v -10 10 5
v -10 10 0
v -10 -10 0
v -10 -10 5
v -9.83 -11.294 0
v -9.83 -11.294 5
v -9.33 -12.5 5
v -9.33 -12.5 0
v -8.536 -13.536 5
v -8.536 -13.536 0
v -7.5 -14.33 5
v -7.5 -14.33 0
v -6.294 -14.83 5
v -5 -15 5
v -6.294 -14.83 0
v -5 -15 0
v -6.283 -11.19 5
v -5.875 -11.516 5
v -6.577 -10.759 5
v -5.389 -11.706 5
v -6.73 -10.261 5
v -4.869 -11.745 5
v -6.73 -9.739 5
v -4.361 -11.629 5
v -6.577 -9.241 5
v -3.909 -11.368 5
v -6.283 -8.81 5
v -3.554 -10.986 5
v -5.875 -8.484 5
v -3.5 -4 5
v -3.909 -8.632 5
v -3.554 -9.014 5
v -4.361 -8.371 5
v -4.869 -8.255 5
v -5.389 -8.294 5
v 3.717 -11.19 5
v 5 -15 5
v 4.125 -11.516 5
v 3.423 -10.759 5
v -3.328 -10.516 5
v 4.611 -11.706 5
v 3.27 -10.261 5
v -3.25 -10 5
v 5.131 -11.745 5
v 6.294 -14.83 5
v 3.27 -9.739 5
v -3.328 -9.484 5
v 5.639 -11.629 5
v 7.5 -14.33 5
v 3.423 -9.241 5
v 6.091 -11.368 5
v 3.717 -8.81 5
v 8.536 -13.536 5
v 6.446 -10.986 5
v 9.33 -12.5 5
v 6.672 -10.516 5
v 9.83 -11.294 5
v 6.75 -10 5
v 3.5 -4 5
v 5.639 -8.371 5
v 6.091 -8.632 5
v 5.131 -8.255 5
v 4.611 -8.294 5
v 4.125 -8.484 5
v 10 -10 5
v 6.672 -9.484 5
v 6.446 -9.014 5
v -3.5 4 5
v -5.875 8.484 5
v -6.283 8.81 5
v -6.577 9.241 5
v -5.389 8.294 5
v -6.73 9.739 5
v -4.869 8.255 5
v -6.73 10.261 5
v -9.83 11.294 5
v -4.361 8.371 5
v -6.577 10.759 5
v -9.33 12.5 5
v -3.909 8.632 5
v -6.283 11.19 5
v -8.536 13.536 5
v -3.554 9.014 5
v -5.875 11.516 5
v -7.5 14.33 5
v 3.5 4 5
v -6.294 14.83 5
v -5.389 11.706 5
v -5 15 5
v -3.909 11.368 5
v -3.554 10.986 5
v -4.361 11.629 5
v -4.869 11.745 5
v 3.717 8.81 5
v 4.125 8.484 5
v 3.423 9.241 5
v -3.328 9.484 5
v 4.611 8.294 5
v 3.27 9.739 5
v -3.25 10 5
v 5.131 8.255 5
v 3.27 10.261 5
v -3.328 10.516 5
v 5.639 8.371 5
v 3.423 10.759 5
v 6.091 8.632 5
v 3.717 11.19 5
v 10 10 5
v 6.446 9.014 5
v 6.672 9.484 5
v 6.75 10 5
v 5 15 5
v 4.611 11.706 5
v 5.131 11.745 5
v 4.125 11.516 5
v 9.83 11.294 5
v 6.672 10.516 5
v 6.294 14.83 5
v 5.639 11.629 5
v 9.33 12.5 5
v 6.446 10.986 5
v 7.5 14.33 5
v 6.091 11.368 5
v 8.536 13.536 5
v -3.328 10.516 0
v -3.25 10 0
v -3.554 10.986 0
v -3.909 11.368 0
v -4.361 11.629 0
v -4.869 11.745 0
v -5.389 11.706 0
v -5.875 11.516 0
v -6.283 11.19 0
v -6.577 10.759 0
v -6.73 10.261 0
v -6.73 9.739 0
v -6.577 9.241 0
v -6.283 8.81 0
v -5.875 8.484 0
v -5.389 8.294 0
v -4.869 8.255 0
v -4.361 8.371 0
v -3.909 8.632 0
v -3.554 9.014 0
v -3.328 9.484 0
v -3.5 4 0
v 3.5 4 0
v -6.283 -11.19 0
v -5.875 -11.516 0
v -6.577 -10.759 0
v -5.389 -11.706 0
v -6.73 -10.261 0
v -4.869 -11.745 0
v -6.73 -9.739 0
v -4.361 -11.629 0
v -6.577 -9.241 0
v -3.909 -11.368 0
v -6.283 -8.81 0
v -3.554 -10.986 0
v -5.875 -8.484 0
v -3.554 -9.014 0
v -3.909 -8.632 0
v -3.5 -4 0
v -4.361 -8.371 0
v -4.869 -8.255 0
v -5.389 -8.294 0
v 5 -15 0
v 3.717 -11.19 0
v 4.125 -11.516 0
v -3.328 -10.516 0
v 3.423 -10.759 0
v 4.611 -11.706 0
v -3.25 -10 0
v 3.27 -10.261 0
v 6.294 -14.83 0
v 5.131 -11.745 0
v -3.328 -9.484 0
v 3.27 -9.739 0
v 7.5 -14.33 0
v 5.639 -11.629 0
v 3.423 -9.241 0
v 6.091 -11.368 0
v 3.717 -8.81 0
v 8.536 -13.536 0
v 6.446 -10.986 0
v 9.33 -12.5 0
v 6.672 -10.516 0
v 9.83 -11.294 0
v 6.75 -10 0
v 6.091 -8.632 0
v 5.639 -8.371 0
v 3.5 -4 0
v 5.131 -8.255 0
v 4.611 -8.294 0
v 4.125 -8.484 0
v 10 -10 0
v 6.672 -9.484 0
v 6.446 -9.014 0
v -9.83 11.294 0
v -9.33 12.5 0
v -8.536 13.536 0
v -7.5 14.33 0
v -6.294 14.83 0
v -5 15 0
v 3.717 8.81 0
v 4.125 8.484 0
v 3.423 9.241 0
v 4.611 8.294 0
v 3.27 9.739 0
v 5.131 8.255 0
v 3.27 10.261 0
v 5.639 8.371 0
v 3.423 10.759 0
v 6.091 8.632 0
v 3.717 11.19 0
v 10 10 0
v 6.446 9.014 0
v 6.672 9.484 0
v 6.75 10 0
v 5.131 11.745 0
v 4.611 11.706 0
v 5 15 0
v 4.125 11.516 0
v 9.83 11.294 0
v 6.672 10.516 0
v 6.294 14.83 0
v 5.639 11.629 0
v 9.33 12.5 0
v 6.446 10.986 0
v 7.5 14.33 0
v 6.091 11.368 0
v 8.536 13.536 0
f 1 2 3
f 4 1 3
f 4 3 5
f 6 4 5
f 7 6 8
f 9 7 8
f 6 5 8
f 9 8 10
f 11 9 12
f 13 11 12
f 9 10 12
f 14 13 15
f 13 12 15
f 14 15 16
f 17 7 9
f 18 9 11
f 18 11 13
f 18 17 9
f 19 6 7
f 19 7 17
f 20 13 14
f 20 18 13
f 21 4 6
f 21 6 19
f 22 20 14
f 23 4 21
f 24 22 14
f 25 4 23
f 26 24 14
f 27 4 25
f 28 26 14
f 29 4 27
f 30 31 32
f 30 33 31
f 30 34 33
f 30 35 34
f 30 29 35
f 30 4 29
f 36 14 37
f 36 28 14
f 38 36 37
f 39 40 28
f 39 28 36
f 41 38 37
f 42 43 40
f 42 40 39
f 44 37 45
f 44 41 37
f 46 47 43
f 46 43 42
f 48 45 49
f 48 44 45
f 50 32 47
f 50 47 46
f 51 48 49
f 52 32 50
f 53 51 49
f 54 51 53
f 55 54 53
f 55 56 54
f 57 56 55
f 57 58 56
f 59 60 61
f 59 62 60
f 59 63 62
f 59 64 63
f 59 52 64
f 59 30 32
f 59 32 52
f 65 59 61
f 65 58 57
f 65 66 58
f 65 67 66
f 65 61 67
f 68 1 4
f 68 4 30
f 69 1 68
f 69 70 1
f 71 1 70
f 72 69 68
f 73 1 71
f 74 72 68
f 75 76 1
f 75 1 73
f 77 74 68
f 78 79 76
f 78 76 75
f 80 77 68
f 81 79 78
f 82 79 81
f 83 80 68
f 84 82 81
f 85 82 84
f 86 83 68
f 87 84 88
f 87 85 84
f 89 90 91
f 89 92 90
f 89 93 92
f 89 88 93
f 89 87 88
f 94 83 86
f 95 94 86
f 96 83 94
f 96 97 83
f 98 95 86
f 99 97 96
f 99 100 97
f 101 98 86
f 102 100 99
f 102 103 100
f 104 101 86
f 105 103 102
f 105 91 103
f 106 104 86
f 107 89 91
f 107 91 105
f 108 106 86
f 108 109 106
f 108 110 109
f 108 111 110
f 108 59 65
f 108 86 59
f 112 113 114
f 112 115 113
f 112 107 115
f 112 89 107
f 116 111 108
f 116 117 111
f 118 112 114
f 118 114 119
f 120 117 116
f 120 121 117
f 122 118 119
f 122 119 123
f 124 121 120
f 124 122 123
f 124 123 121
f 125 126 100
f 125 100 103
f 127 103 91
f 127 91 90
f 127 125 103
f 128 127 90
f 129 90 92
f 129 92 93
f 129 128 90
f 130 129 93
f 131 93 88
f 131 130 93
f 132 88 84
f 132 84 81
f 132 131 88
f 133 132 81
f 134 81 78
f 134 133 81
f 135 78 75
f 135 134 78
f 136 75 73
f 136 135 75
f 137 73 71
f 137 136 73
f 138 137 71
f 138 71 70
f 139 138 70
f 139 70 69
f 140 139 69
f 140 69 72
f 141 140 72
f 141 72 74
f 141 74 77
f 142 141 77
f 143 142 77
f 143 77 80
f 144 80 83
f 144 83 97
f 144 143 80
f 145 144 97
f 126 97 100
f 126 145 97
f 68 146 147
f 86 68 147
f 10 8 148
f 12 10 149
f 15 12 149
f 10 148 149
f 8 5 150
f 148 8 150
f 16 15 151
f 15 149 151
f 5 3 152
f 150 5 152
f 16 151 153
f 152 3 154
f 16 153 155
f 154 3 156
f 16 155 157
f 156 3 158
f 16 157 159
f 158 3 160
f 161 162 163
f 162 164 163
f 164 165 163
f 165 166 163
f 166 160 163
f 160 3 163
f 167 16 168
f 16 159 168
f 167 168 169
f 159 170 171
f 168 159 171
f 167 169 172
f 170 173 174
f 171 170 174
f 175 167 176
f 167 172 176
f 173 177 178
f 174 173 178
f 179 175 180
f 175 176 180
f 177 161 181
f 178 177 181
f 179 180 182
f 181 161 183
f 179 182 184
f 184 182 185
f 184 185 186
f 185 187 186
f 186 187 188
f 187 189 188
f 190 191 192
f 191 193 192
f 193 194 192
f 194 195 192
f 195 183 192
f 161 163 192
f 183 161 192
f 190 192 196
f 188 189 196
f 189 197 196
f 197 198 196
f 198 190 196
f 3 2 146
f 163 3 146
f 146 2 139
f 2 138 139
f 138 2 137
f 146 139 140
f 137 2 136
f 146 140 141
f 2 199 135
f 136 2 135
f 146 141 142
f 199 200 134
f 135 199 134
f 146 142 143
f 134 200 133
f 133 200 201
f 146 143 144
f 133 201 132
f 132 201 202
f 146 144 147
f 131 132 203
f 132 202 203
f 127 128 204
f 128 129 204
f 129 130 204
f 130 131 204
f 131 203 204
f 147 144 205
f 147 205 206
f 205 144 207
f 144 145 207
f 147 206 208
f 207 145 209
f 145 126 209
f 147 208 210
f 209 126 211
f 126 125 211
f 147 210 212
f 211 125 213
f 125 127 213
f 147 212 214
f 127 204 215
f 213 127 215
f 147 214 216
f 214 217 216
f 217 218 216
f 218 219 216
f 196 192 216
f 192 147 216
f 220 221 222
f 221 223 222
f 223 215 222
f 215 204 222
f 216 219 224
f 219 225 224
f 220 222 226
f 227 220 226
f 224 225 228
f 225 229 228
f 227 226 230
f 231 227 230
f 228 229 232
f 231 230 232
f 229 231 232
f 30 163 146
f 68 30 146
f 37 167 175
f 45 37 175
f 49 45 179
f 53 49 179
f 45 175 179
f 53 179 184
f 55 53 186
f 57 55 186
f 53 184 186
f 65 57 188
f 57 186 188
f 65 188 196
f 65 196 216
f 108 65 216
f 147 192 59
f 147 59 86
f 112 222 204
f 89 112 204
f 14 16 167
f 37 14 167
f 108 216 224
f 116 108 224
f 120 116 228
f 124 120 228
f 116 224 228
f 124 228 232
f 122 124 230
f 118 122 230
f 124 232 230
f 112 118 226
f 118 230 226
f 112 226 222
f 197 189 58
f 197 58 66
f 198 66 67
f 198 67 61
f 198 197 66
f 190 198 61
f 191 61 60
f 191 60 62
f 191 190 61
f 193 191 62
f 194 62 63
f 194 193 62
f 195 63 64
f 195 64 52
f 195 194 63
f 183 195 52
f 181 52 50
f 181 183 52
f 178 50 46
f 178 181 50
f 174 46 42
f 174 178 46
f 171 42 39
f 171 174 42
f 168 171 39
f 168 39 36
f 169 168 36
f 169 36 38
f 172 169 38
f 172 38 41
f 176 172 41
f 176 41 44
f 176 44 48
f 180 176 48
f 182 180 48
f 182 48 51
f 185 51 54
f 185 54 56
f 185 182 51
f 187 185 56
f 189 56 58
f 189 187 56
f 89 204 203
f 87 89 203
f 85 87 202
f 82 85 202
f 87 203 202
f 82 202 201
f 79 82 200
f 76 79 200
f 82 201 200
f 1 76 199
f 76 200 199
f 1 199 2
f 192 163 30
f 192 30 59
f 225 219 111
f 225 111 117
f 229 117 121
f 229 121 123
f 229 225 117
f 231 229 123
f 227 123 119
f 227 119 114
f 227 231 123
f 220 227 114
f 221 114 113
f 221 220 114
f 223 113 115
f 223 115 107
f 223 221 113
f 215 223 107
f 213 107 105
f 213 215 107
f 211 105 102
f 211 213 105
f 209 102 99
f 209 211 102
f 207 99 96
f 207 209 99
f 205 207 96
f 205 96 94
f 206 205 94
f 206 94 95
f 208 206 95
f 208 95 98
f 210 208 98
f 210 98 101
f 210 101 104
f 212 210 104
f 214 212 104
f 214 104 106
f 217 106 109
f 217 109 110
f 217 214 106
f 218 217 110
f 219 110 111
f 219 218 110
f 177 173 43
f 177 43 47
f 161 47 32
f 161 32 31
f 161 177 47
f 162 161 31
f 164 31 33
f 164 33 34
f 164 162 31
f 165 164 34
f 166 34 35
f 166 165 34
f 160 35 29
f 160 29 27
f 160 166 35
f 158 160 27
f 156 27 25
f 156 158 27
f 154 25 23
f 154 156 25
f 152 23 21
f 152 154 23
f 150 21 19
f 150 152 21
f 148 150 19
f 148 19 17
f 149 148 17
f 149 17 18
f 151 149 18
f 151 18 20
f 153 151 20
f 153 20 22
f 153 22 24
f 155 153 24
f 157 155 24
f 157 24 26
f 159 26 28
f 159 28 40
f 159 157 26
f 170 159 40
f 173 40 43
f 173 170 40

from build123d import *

# Parameters (mm, degrees)
F0_R     = 1.75
F0_W     = 7
F0_H     = 8
F1_DEPTH = 5


with BuildPart() as f1:
    # F0 (on Top) → F1 (new body)
    with BuildSketch(Plane.XY):
        with BuildLine():
            ThreePointArc((-5, 15), (-8.535534, 13.535534), (-10, 10))
            Line((-10, 10), (-10, -10))
            ThreePointArc((-10, -10), (-8.535534, -13.535534), (-5, -15))
            Line((-5, -15), (5, -15))
            ThreePointArc((5, -15), (8.535534, -13.535534), (10, -10))
            Line((10, -10), (10, 10))
            ThreePointArc((10, 10), (8.535534, 13.535534), (5, 15))
            Line((5, 15), (-5, 15))
        make_face()
        with Locations((-5, -10)):
            Circle(F0_R, mode=Mode.SUBTRACT)
        with Locations((5, -10)):
            Circle(F0_R, mode=Mode.SUBTRACT)
        with Locations((-5, 10)):
            Circle(F0_R, mode=Mode.SUBTRACT)
        Rectangle(F0_W, F0_H, mode=Mode.SUBTRACT)
        with Locations((5, 10)):
            Circle(F0_R, mode=Mode.SUBTRACT)
    extrude(amount=F1_DEPTH)


solid = f1.part
